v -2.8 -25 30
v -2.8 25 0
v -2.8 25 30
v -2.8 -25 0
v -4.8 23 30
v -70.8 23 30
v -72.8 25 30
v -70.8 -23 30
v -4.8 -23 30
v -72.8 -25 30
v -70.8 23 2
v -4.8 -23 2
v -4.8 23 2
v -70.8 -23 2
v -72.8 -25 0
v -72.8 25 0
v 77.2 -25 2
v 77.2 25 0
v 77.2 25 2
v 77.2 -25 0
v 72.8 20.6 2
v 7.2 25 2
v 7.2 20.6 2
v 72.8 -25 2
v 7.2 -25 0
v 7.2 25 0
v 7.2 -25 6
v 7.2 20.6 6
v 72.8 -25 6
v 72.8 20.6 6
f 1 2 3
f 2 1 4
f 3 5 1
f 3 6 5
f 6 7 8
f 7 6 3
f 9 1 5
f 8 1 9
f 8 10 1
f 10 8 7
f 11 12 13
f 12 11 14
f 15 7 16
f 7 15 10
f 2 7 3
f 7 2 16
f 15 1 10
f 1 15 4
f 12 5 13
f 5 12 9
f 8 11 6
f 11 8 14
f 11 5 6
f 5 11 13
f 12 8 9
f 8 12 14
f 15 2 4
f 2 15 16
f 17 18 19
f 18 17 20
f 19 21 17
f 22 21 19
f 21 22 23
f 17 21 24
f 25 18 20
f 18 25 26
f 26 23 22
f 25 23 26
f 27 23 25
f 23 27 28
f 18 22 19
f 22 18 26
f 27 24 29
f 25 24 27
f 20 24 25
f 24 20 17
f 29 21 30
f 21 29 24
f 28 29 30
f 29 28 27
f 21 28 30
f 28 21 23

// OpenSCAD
// Two-part enclosure for small electronics board
// Part 1: Box (left)
// Part 2: Lid (right, printed upside down)
// Prints together with a 10mm gap.

$fn = 64;

// --- Dimensions ---

// Part 1: Box
// Outer size X x Y x Z
BOX_OUT_X = 70;
BOX_OUT_Y = 50;
BOX_OUT_Z = 30;
// Wall and floor thickness
BOX_WALL_THICK = 2;
BOX_FLOOR_THICK = 2;

// Part 2: Lid
// Base plate thickness
LID_PLATE_THICK = 2;
// Lip dimensions
LIP_WALL_THICK = 1.5;
LIP_HEIGHT = 4;
// Lip outer size (fits inside box opening)
LIP_OUT_X = 65.6;
LIP_OUT_Y = 45.6;
// Clearance per side (calculated from outer size vs box inner size)
// Box inner X = 70 - 2*2 = 66. Lip outer X = 65.6. Clearance = (66-65.6)/2 = 0.2
CLEARANCE_X = 0.2;
// Clearance Y = (50 - 2*2 - 45.6)/2 = (46 - 45.6)/2 = 0.2
CLEARANCE_Y = 0.2;

// --- Positioning ---
// Gap between parts
PART_GAP = 10;

// Center the whole assembly on the bed (X=0)
// Total width = BOX_OUT_X + PART_GAP + LIP_OUT_X
TOTAL_WIDTH = BOX_OUT_X + PART_GAP + LIP_OUT_X;
ORIGIN_X = -TOTAL_WIDTH / 2;

// Center Y
ORIGIN_Y = -BOX_OUT_Y / 2;

// Z starts at 0
ORIGIN_Z = 0;

// --- Helper Functions ---

// Create the Box (Part 1)
module box() {
    translate([ORIGIN_X, ORIGIN_Y, ORIGIN_Z]) {
        // Calculate inner dimensions
        INNER_X = BOX_OUT_X - 2 * BOX_WALL_THICK;
        INNER_Y = BOX_OUT_Y - 2 * BOX_WALL_THICK;
        // Wall height is Total Height - Floor Thickness
        WALL_HEIGHT = BOX_OUT_Z - BOX_FLOOR_THICK;
        
        // Build from bottom up
        // 1. Floor
        cube([BOX_OUT_X, BOX_OUT_Y, BOX_FLOOR_THICK], center=false);
        
        // 2. Walls (using difference to cut out the hole)
        // We create a solid block of walls and subtract the inner volume.
        // The wall block sits on top of the floor.
        difference() {
            // Solid block representing the walls (sitting on the floor)
            translate([0, 0, BOX_FLOOR_THICK]) {
                cube([BOX_OUT_X, BOX_OUT_Y, WALL_HEIGHT], center=false);
            }
            
            // Cut out the inner empty space
            // The hole starts at the top of the floor
            translate([BOX_WALL_THICK, BOX_WALL_THICK, BOX_FLOOR_THICK]) {
                cube([INNER_X, INNER_Y, WALL_HEIGHT], center=false);
            }
        }
    }
}

// Create the Lid (Part 2)
// The lid is printed upside down relative to the box opening.
// The plate lies on the bed. The lip sticks UP from the plate.
// The lip outer size is 65.6 x 45.6.
// The box inner size is 66 x 46.
// Clearance is 0.2 on each side.
// The lip slides into the box.

module lid() {
    translate([ORIGIN_X + BOX_OUT_X + PART_GAP, ORIGIN_Y, ORIGIN_Z]) {
        // Base Plate
        cube([BOX_OUT_X, BOX_OUT_Y, LID_PLATE_THICK], center=false);
        
        // Lip
        // The lip sits ON TOP of the plate.
        // Lip outer dimensions: LIP_OUT_X x LIP_OUT_Y
        // Lip wall thickness: LIP_WALL_THICK
        // Lip height: LIP_HEIGHT
        
        // We construct the lip as a hollow box sitting on the plate.
        
        // 1. Solid block for the lip walls + plate connection
        // Dimensions: LIP_OUT_X x LIP_OUT_Y x (LIP_HEIGHT + LID_PLATE_THICK)
        // We place this block starting at Z = LID_PLATE_THICK
        
        // Lip Outer Box (Solid)
        translate([0, 0, LID_PLATE_THICK]) {
            cube([LIP_OUT_X, LIP_OUT_Y, LIP_HEIGHT], center=false);
        }
        
        // Lip Inner Hole (Cutout)
        // The hole goes through the lip walls.
        // It starts at the top of the lip (Z = LID_PLATE_THICK + LIP_HEIGHT)
        // and goes down to the top of the plate (Z = LID_PLATE_THICK).
        // Actually, usually the hole goes all the way through the lip walls.
        // Does it go into the plate? No, the plate is solid.
        // So the hole is a cylinder/box of height LIP_HEIGHT.
        
        translate([LIP_WALL_THICK, LIP_WALL_THICK, LID_PLATE_THICK]) {
            cube([LIP_OUT_X - 2*LIP_WALL_THICK, LIP_OUT_Y - 2*LIP_WALL_THICK, LIP_HEIGHT], center=false);
        }
    }
}

// --- Main Assembly ---

// We use union to combine the two parts.
// Since they are separated by a gap, they will remain distinct bodies in the final mesh 
// (unless the slicer merges them, but OpenSCAD treats them as one union object).
// The prompt asks for "two-part enclosure... so they print together".
// Placing them in the same file with a gap achieves this.

union() {
    // Part 1: Box
    box();
    
    // Part 2: Lid
    lid();
}
